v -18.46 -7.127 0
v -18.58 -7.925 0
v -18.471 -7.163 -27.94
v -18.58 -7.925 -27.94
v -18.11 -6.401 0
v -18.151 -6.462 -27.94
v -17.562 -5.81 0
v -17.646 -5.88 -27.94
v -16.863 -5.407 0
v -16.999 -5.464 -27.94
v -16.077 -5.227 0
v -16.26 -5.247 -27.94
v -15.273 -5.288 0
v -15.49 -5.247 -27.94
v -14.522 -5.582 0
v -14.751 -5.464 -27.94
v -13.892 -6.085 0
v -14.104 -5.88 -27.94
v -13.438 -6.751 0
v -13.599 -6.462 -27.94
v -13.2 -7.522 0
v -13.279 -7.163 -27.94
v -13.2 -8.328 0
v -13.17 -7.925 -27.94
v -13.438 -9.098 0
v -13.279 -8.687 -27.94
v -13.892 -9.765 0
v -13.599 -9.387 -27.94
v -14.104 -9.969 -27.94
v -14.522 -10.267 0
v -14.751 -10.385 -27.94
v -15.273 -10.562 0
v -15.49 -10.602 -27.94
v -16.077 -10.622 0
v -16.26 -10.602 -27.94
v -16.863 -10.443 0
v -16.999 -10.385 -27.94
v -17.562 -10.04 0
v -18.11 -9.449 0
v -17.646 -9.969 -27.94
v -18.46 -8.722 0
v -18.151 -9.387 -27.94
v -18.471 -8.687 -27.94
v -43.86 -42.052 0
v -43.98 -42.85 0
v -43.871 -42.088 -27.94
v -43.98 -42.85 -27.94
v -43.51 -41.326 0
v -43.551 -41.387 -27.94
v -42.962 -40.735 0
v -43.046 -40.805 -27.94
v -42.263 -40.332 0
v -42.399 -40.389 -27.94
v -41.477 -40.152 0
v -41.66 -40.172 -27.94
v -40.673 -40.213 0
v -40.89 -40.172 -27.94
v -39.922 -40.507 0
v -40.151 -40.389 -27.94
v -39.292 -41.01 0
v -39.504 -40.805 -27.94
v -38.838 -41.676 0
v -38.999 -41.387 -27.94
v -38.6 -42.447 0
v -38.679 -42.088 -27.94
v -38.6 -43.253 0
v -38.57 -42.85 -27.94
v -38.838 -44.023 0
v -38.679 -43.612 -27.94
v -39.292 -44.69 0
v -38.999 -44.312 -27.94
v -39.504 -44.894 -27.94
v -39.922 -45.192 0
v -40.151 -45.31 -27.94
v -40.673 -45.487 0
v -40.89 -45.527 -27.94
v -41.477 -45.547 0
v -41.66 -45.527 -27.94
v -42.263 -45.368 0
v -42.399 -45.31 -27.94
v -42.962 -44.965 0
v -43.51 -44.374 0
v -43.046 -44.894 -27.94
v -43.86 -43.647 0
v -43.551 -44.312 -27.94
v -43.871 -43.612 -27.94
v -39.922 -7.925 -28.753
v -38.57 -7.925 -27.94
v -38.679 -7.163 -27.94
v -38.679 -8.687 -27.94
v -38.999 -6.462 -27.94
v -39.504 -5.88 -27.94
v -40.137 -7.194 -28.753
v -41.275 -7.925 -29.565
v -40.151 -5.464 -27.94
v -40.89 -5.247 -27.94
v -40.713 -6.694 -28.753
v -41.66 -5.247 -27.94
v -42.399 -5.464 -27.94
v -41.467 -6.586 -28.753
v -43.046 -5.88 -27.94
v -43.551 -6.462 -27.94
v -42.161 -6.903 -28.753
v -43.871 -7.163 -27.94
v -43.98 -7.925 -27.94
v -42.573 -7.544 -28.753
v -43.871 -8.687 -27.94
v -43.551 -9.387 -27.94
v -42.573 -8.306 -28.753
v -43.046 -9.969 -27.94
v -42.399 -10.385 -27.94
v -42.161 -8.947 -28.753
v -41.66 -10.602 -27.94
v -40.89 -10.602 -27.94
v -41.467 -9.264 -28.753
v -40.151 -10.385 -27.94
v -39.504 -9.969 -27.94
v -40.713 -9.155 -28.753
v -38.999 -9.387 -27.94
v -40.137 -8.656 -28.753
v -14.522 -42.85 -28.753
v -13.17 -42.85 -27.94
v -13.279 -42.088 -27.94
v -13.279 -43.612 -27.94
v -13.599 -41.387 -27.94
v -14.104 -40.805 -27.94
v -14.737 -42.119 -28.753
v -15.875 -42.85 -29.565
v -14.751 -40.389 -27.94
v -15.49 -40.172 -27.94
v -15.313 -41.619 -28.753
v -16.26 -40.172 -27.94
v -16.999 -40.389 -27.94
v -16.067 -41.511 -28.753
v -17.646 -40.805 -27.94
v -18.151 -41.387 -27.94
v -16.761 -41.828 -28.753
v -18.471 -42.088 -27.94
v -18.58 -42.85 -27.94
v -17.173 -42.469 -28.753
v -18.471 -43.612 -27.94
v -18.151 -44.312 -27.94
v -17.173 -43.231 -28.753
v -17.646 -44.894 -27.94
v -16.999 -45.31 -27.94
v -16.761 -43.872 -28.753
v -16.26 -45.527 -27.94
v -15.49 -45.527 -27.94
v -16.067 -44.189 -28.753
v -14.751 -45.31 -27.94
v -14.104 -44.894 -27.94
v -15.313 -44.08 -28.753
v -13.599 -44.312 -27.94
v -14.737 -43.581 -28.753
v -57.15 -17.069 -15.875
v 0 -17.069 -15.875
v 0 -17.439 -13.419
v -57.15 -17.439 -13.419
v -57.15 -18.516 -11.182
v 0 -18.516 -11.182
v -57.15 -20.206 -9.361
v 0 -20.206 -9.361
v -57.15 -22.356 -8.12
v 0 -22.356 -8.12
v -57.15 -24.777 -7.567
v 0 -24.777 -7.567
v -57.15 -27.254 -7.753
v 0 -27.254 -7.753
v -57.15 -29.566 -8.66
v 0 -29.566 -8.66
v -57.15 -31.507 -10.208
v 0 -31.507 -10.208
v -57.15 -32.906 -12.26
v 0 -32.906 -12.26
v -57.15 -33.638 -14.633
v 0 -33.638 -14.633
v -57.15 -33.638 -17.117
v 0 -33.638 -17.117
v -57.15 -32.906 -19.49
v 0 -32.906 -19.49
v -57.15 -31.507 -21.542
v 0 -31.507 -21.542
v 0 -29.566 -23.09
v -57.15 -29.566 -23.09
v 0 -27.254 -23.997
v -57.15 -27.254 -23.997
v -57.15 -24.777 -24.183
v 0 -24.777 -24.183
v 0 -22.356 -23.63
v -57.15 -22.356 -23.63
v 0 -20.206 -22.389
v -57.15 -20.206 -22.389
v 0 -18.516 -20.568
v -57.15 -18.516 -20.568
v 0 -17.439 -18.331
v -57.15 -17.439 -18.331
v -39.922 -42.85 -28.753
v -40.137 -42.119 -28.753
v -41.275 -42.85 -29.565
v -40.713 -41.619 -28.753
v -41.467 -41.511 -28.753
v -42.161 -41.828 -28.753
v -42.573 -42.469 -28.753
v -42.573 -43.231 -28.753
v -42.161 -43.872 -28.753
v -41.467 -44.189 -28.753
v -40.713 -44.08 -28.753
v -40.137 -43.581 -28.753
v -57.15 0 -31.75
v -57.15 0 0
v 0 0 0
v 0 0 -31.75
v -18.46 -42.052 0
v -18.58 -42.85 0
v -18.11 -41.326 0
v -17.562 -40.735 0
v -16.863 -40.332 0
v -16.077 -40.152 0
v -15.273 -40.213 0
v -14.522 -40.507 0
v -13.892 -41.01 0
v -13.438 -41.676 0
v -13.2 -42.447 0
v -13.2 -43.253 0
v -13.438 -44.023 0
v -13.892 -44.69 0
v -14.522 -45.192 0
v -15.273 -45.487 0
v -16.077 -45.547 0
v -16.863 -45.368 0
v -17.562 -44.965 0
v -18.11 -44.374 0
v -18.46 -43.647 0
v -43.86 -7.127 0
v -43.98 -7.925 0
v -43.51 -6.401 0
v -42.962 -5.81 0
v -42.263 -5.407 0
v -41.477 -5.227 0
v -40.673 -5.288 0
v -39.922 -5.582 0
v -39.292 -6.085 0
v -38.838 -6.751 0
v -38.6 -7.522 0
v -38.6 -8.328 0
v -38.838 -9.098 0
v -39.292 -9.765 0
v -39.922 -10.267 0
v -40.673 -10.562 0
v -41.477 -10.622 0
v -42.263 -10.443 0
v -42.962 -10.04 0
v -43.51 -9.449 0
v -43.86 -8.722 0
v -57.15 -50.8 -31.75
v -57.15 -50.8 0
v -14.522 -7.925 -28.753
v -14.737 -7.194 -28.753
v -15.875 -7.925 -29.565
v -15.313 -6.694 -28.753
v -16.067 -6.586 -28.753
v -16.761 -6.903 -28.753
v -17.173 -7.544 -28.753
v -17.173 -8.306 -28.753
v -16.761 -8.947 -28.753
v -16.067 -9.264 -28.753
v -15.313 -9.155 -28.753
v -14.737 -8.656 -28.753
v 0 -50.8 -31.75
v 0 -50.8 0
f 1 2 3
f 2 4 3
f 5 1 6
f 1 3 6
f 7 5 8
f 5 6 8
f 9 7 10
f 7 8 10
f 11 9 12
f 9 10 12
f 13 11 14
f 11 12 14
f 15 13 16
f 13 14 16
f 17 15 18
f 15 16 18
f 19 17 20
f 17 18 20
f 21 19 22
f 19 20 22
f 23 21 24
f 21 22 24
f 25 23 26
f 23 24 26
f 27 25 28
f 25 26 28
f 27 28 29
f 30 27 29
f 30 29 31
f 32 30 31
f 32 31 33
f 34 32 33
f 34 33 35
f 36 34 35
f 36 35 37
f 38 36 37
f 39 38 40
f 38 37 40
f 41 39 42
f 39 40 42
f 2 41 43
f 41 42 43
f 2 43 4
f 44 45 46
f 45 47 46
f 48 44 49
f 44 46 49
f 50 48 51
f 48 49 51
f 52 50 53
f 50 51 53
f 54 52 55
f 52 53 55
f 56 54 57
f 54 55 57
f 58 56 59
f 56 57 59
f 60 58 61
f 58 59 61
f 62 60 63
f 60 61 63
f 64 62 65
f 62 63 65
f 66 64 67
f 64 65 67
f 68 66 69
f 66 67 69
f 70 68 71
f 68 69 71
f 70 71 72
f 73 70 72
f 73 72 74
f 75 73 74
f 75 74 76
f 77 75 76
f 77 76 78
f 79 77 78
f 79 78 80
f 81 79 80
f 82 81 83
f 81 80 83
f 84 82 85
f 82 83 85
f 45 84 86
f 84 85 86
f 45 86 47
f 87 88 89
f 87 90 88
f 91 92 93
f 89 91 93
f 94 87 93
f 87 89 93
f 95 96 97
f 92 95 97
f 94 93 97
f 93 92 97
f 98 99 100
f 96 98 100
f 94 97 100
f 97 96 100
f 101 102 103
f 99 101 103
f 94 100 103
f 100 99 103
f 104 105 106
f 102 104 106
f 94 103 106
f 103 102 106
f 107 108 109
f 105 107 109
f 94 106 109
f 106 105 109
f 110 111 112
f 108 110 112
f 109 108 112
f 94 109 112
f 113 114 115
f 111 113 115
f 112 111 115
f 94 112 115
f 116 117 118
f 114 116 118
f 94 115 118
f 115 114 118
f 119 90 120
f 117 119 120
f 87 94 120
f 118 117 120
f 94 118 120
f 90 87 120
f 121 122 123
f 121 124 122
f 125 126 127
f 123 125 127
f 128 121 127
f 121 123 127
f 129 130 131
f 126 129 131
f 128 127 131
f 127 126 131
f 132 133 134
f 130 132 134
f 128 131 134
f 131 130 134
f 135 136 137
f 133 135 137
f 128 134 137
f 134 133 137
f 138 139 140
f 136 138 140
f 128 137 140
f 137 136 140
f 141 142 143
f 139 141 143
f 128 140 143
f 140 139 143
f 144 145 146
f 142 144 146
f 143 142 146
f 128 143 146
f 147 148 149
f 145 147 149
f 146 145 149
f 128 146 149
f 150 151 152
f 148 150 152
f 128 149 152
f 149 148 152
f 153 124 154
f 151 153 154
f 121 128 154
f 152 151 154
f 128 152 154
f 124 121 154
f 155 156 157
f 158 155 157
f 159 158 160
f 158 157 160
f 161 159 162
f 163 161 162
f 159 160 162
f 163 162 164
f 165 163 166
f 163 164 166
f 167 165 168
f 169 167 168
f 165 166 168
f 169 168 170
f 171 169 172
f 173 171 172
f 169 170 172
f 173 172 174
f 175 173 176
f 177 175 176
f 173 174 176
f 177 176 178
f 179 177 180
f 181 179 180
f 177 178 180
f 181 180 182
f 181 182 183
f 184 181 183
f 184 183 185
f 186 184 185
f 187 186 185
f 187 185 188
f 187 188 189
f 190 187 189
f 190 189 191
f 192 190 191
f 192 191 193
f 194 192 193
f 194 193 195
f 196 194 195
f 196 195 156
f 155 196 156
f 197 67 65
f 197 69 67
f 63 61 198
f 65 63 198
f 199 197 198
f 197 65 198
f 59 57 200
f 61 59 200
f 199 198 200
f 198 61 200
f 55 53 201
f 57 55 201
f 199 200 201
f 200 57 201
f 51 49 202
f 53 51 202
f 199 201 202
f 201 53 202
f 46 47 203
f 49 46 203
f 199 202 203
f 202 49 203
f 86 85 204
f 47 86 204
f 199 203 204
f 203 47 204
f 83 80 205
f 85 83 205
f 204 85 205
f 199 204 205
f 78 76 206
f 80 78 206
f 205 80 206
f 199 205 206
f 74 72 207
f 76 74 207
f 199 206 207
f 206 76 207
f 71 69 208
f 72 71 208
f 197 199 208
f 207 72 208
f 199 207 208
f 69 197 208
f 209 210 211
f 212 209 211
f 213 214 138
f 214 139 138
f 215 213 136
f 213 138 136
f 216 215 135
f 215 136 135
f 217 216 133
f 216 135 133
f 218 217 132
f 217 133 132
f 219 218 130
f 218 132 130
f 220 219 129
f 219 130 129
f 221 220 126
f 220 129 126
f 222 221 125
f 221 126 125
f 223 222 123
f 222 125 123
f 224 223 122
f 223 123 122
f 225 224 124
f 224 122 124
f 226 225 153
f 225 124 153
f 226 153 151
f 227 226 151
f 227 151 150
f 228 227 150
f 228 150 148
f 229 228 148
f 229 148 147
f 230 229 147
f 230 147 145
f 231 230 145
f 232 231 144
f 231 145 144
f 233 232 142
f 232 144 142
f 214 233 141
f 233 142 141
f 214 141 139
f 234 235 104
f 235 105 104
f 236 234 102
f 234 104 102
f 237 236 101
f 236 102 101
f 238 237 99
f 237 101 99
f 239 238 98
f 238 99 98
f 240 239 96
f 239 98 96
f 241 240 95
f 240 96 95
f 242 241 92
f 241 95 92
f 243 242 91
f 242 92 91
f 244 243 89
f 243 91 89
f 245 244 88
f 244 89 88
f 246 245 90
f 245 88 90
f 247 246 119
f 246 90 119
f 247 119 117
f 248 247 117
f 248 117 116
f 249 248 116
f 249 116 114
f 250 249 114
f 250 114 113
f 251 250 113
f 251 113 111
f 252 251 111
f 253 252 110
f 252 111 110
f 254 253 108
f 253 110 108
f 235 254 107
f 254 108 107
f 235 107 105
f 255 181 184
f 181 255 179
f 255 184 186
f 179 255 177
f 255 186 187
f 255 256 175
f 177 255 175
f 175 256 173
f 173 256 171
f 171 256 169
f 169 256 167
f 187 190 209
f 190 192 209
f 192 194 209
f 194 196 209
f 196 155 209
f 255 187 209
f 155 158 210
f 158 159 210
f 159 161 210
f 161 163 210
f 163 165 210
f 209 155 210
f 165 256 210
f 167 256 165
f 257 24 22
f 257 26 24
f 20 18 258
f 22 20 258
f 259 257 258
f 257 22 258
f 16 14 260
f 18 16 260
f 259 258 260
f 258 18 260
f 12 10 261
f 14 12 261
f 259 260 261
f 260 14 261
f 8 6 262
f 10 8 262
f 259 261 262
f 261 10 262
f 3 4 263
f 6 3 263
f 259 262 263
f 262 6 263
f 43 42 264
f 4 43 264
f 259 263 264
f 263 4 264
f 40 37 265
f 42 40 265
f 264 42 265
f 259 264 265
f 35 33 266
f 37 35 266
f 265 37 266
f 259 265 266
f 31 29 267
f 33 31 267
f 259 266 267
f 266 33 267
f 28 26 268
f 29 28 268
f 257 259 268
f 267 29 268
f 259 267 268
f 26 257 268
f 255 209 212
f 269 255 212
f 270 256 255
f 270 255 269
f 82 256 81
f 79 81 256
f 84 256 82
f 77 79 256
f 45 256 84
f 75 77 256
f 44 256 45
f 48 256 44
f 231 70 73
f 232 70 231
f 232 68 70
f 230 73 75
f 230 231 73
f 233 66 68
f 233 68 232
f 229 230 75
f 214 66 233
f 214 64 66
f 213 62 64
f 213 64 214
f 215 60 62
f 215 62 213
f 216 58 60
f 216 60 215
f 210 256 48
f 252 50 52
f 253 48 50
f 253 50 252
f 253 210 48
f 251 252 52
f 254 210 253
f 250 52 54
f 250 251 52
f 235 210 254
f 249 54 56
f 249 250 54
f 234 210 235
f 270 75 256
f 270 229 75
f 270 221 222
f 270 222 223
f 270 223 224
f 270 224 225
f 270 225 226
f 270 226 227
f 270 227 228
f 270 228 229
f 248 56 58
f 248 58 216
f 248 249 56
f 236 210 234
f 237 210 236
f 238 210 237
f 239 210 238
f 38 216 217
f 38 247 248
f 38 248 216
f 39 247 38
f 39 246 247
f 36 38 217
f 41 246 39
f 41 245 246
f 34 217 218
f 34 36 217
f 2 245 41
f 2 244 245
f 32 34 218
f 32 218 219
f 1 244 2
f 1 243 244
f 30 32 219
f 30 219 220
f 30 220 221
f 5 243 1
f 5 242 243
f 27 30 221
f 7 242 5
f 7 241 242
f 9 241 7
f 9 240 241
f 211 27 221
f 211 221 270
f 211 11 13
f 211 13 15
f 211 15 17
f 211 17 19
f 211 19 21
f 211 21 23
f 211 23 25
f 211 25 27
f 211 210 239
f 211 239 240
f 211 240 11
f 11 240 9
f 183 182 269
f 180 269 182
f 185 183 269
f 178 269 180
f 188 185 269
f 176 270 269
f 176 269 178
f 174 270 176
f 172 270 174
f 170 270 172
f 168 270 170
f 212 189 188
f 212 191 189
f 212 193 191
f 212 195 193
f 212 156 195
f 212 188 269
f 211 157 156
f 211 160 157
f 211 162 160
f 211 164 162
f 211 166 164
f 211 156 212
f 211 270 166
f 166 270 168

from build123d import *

# Parameters (mm, degrees)
F0_W     = 57.15
F0_H     = 50.8
F1_DEPTH = 31.75
F2_D     = 5.4102
F2_DEPTH = 27.94
F2_TIP   = 1.6253880605
F3_R     = 8.3312
F4_DEPTH = 57.151


with BuildPart() as f1:
    # F0 (on Top) → F1 (new body)
    with BuildSketch(Plane.XY):
        with Locations((-28.575, -25.4)):
            Rectangle(F0_W, F0_H)
    extrude(amount=-F1_DEPTH)

    # F2
    with Locations(Plane.XY):
        with Locations((-15.875, -7.9248), (-15.875, -42.8498), (-41.275, -42.8498), (-41.275, -7.9248)):
            Hole(F2_D / 2, depth=F2_DEPTH)
            with Locations((0, 0, -(F2_DEPTH + F2_TIP / 2))):  # 118° drill point
                Cone(0, F2_D / 2, F2_TIP, mode=Mode.SUBTRACT)

    # F3 (on face) → F4 (cut, through all)
    with BuildSketch(Plane.YZ):
        with Locations((-25.4, -15.875)):
            Circle(F3_R)
    extrude(amount=-F4_DEPTH, mode=Mode.SUBTRACT)


solid = f1.part
